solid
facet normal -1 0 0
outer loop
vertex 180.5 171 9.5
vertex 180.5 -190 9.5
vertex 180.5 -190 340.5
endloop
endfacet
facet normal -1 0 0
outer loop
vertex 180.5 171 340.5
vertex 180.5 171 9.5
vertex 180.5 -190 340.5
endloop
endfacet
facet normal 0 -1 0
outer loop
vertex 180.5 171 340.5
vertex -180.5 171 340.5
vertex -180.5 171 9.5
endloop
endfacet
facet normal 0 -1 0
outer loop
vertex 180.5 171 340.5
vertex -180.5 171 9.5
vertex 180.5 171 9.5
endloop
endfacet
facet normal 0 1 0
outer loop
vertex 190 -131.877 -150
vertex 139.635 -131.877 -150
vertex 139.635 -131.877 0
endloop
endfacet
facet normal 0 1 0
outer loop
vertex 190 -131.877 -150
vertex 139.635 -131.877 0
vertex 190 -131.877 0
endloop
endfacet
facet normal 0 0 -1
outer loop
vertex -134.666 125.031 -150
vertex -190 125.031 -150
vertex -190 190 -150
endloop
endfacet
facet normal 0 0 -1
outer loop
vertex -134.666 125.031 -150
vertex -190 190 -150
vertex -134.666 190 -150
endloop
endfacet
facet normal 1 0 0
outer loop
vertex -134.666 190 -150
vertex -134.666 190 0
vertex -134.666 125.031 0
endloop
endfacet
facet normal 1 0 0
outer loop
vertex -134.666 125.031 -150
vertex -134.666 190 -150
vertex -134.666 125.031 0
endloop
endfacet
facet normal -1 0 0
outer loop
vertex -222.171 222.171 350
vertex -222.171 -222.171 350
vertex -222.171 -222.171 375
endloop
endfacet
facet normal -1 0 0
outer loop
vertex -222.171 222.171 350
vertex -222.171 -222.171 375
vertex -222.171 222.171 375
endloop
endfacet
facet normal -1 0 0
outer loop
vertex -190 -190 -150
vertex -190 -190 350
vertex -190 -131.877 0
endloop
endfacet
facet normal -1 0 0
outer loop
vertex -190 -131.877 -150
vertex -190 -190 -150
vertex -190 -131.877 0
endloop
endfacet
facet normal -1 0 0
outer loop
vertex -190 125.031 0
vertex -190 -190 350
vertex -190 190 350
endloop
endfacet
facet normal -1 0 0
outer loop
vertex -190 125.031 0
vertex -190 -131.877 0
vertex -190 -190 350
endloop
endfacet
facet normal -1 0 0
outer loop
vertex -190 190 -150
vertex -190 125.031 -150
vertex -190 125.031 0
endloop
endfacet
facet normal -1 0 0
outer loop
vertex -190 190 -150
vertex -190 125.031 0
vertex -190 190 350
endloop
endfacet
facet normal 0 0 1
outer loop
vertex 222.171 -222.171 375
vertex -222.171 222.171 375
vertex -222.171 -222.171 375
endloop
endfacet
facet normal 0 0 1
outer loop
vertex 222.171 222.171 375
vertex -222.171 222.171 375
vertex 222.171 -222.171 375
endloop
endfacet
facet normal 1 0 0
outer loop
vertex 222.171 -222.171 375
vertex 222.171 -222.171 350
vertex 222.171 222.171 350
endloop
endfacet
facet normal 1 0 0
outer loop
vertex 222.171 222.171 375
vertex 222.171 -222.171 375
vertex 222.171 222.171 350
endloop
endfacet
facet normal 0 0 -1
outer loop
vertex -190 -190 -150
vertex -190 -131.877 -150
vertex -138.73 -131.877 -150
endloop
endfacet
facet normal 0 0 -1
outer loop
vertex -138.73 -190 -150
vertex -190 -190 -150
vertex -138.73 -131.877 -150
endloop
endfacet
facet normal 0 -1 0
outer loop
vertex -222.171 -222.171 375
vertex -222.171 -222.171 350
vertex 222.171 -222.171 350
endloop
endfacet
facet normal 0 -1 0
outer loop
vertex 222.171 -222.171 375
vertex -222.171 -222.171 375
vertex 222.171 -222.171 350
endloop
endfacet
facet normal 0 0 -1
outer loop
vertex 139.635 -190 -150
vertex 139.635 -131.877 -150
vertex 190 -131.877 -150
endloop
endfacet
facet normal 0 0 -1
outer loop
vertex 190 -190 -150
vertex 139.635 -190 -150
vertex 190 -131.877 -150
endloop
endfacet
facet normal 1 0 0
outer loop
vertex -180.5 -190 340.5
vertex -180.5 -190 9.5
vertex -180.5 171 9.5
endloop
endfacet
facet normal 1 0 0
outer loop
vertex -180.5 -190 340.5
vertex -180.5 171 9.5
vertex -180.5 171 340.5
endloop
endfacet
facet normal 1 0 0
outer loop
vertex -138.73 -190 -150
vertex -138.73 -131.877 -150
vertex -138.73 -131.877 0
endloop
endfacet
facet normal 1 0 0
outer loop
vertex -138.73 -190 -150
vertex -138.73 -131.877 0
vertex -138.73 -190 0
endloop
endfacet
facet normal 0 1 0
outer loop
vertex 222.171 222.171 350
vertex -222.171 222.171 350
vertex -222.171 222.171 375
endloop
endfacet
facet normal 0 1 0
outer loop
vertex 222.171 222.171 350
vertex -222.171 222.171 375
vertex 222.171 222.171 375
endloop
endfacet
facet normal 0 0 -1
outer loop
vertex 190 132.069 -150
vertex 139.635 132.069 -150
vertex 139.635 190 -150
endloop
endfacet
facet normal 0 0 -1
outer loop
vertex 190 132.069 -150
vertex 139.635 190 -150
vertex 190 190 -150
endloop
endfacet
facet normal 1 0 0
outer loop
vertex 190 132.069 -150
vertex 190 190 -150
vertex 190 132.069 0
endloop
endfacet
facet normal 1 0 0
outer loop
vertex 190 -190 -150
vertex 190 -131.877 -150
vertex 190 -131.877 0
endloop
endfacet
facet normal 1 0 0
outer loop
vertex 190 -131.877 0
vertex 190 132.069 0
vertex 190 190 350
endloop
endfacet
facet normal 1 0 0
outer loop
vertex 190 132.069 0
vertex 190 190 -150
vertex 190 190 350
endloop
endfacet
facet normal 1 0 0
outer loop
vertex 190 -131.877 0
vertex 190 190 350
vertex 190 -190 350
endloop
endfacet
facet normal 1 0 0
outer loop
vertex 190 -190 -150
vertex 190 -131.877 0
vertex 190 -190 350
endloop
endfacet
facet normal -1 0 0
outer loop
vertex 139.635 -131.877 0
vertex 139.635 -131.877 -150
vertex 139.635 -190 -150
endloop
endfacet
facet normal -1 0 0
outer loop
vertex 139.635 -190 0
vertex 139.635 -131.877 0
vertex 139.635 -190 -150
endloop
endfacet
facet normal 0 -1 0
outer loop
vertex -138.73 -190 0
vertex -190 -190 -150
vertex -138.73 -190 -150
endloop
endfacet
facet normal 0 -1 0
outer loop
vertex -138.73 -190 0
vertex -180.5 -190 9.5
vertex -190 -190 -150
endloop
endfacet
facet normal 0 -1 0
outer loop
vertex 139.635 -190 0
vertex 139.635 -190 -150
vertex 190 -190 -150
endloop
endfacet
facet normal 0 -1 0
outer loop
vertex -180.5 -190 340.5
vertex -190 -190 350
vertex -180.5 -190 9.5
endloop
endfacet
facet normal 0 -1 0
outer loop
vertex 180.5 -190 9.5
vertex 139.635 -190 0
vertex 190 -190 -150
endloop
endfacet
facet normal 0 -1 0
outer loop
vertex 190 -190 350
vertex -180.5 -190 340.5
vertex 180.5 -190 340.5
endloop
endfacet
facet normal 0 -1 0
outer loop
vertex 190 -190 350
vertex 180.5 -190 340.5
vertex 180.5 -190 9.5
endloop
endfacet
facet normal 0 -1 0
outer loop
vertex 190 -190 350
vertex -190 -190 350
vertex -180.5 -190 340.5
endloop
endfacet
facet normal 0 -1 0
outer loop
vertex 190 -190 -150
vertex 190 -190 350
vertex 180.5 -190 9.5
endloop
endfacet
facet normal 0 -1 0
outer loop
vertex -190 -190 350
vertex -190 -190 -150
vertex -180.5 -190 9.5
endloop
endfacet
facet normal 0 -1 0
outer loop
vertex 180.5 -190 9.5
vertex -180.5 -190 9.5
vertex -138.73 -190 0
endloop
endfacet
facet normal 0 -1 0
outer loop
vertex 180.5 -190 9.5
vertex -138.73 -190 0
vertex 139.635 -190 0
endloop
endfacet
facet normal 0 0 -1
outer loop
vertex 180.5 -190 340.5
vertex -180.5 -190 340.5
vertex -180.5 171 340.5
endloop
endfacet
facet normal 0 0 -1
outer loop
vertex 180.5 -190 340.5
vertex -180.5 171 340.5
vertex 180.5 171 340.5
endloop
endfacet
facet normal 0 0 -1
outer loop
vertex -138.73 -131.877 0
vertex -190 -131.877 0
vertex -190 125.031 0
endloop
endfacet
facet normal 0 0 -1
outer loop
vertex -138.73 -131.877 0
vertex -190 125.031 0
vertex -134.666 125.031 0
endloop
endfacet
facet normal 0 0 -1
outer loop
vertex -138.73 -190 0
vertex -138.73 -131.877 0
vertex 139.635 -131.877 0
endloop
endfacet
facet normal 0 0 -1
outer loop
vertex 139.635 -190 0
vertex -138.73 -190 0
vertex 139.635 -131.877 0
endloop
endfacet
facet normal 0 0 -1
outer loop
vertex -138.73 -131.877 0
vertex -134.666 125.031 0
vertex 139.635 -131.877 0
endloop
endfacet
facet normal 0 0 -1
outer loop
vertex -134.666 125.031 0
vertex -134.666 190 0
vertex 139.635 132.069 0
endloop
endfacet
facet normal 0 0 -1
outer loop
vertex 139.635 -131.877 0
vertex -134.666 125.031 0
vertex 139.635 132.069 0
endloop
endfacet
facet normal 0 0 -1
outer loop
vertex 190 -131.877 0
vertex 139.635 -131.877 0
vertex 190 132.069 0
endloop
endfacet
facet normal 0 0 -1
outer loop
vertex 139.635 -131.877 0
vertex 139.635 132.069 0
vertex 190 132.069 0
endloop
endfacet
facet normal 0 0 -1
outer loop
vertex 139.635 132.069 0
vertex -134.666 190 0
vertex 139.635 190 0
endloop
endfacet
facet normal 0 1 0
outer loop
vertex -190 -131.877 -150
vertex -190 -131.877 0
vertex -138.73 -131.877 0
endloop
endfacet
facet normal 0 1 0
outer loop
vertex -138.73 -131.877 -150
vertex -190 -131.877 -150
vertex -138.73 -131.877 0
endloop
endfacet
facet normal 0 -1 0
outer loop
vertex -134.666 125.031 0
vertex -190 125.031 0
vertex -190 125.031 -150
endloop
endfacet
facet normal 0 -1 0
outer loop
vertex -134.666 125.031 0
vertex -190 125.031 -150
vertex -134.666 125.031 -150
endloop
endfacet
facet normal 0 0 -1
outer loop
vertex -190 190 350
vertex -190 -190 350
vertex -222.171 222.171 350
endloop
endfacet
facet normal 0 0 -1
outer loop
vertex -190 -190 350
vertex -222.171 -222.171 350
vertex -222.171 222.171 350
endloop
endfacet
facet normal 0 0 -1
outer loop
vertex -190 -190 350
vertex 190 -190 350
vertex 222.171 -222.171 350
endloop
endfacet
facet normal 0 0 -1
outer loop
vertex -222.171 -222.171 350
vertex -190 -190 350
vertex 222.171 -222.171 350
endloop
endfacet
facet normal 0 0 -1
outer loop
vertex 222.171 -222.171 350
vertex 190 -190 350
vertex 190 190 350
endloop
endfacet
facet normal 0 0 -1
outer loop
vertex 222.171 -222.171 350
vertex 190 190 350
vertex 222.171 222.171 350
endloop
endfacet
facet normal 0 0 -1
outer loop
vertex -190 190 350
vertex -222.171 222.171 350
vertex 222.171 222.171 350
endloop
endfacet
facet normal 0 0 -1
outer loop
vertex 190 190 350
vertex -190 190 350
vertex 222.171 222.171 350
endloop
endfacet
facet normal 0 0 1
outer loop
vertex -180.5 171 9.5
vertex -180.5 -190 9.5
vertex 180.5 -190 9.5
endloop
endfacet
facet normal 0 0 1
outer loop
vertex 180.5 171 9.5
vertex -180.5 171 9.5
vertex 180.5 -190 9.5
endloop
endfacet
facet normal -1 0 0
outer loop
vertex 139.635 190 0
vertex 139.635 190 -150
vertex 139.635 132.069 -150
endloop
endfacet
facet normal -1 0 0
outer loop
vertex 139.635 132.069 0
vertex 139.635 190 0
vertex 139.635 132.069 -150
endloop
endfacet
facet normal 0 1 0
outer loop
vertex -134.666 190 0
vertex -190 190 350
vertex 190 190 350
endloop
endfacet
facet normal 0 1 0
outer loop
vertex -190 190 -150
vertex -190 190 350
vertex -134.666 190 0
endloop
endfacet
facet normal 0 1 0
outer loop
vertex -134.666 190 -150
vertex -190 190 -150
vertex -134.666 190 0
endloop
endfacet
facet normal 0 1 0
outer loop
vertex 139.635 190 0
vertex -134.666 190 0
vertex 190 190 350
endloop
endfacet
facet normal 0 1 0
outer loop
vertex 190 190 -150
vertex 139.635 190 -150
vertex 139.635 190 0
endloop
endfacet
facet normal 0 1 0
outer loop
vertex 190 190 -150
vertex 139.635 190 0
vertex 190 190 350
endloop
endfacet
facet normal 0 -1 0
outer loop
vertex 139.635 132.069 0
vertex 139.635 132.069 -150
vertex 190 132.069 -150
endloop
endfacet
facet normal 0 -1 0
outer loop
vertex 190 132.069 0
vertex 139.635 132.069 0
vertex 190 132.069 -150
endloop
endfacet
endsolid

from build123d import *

# Parameters (mm, degrees)
F0_W     = 380
F0_H     = 380
F1_DEPTH = 350
F2_W     = 361
F2_H     = 331
F3_DEPTH = 361
F4_W     = 50.3650778532
F4_H     = 58.1228607893
F4_H_2   = 57.9308593273
F4_W_2   = 55.3338849545
F4_H_3   = 64.9694228172
F4_W_3   = 51.270159483
F5_DEPTH = 150
F6_W     = 444.3413615227
F6_H     = 444.3413615227
F6_W_2   = 380
F6_H_2   = 380
F7_DEPTH = 25


with BuildPart() as f1:
    # F0 (on Top) → F1 (new body)
    with BuildSketch(Plane.XY):
        Rectangle(F0_W, F0_H)
    extrude(amount=F1_DEPTH)

    # F2 (on face) → F3 (cut)
    with BuildSketch(Plane.XZ.offset(190)):
        with Locations((0, 175)):
            Rectangle(F2_W, F2_H)
    extrude(amount=-F3_DEPTH, mode=Mode.SUBTRACT)

    # F4 (on face) → F5 (join)
    with BuildSketch(Plane(origin=(0, 0, 0), x_dir=(1, 0, 0), z_dir=(0, 0, -1))):
        with Locations((164.8174610734, 160.9385696054)):
            Rectangle(F4_W, F4_H)
        with Locations((164.8174610734, -161.0345703363)):
            Rectangle(F4_W, F4_H_2)
        with Locations((-162.3330575228, -157.5152885914)):
            Rectangle(F4_W_2, F4_H_3)
        with Locations((-164.3649202585, 160.9385696054)):
            Rectangle(F4_W_3, F4_H)
    extrude(amount=F5_DEPTH)

    # F6 (on face) → F7 (join)
    with BuildSketch(Plane.XY.offset(350)):
        Rectangle(F6_W, F6_H)
        Rectangle(F6_W_2, F6_H_2, mode=Mode.SUBTRACT)
        Rectangle(F6_W_2, F6_H_2)
    extrude(amount=F7_DEPTH)


solid = f1.part
